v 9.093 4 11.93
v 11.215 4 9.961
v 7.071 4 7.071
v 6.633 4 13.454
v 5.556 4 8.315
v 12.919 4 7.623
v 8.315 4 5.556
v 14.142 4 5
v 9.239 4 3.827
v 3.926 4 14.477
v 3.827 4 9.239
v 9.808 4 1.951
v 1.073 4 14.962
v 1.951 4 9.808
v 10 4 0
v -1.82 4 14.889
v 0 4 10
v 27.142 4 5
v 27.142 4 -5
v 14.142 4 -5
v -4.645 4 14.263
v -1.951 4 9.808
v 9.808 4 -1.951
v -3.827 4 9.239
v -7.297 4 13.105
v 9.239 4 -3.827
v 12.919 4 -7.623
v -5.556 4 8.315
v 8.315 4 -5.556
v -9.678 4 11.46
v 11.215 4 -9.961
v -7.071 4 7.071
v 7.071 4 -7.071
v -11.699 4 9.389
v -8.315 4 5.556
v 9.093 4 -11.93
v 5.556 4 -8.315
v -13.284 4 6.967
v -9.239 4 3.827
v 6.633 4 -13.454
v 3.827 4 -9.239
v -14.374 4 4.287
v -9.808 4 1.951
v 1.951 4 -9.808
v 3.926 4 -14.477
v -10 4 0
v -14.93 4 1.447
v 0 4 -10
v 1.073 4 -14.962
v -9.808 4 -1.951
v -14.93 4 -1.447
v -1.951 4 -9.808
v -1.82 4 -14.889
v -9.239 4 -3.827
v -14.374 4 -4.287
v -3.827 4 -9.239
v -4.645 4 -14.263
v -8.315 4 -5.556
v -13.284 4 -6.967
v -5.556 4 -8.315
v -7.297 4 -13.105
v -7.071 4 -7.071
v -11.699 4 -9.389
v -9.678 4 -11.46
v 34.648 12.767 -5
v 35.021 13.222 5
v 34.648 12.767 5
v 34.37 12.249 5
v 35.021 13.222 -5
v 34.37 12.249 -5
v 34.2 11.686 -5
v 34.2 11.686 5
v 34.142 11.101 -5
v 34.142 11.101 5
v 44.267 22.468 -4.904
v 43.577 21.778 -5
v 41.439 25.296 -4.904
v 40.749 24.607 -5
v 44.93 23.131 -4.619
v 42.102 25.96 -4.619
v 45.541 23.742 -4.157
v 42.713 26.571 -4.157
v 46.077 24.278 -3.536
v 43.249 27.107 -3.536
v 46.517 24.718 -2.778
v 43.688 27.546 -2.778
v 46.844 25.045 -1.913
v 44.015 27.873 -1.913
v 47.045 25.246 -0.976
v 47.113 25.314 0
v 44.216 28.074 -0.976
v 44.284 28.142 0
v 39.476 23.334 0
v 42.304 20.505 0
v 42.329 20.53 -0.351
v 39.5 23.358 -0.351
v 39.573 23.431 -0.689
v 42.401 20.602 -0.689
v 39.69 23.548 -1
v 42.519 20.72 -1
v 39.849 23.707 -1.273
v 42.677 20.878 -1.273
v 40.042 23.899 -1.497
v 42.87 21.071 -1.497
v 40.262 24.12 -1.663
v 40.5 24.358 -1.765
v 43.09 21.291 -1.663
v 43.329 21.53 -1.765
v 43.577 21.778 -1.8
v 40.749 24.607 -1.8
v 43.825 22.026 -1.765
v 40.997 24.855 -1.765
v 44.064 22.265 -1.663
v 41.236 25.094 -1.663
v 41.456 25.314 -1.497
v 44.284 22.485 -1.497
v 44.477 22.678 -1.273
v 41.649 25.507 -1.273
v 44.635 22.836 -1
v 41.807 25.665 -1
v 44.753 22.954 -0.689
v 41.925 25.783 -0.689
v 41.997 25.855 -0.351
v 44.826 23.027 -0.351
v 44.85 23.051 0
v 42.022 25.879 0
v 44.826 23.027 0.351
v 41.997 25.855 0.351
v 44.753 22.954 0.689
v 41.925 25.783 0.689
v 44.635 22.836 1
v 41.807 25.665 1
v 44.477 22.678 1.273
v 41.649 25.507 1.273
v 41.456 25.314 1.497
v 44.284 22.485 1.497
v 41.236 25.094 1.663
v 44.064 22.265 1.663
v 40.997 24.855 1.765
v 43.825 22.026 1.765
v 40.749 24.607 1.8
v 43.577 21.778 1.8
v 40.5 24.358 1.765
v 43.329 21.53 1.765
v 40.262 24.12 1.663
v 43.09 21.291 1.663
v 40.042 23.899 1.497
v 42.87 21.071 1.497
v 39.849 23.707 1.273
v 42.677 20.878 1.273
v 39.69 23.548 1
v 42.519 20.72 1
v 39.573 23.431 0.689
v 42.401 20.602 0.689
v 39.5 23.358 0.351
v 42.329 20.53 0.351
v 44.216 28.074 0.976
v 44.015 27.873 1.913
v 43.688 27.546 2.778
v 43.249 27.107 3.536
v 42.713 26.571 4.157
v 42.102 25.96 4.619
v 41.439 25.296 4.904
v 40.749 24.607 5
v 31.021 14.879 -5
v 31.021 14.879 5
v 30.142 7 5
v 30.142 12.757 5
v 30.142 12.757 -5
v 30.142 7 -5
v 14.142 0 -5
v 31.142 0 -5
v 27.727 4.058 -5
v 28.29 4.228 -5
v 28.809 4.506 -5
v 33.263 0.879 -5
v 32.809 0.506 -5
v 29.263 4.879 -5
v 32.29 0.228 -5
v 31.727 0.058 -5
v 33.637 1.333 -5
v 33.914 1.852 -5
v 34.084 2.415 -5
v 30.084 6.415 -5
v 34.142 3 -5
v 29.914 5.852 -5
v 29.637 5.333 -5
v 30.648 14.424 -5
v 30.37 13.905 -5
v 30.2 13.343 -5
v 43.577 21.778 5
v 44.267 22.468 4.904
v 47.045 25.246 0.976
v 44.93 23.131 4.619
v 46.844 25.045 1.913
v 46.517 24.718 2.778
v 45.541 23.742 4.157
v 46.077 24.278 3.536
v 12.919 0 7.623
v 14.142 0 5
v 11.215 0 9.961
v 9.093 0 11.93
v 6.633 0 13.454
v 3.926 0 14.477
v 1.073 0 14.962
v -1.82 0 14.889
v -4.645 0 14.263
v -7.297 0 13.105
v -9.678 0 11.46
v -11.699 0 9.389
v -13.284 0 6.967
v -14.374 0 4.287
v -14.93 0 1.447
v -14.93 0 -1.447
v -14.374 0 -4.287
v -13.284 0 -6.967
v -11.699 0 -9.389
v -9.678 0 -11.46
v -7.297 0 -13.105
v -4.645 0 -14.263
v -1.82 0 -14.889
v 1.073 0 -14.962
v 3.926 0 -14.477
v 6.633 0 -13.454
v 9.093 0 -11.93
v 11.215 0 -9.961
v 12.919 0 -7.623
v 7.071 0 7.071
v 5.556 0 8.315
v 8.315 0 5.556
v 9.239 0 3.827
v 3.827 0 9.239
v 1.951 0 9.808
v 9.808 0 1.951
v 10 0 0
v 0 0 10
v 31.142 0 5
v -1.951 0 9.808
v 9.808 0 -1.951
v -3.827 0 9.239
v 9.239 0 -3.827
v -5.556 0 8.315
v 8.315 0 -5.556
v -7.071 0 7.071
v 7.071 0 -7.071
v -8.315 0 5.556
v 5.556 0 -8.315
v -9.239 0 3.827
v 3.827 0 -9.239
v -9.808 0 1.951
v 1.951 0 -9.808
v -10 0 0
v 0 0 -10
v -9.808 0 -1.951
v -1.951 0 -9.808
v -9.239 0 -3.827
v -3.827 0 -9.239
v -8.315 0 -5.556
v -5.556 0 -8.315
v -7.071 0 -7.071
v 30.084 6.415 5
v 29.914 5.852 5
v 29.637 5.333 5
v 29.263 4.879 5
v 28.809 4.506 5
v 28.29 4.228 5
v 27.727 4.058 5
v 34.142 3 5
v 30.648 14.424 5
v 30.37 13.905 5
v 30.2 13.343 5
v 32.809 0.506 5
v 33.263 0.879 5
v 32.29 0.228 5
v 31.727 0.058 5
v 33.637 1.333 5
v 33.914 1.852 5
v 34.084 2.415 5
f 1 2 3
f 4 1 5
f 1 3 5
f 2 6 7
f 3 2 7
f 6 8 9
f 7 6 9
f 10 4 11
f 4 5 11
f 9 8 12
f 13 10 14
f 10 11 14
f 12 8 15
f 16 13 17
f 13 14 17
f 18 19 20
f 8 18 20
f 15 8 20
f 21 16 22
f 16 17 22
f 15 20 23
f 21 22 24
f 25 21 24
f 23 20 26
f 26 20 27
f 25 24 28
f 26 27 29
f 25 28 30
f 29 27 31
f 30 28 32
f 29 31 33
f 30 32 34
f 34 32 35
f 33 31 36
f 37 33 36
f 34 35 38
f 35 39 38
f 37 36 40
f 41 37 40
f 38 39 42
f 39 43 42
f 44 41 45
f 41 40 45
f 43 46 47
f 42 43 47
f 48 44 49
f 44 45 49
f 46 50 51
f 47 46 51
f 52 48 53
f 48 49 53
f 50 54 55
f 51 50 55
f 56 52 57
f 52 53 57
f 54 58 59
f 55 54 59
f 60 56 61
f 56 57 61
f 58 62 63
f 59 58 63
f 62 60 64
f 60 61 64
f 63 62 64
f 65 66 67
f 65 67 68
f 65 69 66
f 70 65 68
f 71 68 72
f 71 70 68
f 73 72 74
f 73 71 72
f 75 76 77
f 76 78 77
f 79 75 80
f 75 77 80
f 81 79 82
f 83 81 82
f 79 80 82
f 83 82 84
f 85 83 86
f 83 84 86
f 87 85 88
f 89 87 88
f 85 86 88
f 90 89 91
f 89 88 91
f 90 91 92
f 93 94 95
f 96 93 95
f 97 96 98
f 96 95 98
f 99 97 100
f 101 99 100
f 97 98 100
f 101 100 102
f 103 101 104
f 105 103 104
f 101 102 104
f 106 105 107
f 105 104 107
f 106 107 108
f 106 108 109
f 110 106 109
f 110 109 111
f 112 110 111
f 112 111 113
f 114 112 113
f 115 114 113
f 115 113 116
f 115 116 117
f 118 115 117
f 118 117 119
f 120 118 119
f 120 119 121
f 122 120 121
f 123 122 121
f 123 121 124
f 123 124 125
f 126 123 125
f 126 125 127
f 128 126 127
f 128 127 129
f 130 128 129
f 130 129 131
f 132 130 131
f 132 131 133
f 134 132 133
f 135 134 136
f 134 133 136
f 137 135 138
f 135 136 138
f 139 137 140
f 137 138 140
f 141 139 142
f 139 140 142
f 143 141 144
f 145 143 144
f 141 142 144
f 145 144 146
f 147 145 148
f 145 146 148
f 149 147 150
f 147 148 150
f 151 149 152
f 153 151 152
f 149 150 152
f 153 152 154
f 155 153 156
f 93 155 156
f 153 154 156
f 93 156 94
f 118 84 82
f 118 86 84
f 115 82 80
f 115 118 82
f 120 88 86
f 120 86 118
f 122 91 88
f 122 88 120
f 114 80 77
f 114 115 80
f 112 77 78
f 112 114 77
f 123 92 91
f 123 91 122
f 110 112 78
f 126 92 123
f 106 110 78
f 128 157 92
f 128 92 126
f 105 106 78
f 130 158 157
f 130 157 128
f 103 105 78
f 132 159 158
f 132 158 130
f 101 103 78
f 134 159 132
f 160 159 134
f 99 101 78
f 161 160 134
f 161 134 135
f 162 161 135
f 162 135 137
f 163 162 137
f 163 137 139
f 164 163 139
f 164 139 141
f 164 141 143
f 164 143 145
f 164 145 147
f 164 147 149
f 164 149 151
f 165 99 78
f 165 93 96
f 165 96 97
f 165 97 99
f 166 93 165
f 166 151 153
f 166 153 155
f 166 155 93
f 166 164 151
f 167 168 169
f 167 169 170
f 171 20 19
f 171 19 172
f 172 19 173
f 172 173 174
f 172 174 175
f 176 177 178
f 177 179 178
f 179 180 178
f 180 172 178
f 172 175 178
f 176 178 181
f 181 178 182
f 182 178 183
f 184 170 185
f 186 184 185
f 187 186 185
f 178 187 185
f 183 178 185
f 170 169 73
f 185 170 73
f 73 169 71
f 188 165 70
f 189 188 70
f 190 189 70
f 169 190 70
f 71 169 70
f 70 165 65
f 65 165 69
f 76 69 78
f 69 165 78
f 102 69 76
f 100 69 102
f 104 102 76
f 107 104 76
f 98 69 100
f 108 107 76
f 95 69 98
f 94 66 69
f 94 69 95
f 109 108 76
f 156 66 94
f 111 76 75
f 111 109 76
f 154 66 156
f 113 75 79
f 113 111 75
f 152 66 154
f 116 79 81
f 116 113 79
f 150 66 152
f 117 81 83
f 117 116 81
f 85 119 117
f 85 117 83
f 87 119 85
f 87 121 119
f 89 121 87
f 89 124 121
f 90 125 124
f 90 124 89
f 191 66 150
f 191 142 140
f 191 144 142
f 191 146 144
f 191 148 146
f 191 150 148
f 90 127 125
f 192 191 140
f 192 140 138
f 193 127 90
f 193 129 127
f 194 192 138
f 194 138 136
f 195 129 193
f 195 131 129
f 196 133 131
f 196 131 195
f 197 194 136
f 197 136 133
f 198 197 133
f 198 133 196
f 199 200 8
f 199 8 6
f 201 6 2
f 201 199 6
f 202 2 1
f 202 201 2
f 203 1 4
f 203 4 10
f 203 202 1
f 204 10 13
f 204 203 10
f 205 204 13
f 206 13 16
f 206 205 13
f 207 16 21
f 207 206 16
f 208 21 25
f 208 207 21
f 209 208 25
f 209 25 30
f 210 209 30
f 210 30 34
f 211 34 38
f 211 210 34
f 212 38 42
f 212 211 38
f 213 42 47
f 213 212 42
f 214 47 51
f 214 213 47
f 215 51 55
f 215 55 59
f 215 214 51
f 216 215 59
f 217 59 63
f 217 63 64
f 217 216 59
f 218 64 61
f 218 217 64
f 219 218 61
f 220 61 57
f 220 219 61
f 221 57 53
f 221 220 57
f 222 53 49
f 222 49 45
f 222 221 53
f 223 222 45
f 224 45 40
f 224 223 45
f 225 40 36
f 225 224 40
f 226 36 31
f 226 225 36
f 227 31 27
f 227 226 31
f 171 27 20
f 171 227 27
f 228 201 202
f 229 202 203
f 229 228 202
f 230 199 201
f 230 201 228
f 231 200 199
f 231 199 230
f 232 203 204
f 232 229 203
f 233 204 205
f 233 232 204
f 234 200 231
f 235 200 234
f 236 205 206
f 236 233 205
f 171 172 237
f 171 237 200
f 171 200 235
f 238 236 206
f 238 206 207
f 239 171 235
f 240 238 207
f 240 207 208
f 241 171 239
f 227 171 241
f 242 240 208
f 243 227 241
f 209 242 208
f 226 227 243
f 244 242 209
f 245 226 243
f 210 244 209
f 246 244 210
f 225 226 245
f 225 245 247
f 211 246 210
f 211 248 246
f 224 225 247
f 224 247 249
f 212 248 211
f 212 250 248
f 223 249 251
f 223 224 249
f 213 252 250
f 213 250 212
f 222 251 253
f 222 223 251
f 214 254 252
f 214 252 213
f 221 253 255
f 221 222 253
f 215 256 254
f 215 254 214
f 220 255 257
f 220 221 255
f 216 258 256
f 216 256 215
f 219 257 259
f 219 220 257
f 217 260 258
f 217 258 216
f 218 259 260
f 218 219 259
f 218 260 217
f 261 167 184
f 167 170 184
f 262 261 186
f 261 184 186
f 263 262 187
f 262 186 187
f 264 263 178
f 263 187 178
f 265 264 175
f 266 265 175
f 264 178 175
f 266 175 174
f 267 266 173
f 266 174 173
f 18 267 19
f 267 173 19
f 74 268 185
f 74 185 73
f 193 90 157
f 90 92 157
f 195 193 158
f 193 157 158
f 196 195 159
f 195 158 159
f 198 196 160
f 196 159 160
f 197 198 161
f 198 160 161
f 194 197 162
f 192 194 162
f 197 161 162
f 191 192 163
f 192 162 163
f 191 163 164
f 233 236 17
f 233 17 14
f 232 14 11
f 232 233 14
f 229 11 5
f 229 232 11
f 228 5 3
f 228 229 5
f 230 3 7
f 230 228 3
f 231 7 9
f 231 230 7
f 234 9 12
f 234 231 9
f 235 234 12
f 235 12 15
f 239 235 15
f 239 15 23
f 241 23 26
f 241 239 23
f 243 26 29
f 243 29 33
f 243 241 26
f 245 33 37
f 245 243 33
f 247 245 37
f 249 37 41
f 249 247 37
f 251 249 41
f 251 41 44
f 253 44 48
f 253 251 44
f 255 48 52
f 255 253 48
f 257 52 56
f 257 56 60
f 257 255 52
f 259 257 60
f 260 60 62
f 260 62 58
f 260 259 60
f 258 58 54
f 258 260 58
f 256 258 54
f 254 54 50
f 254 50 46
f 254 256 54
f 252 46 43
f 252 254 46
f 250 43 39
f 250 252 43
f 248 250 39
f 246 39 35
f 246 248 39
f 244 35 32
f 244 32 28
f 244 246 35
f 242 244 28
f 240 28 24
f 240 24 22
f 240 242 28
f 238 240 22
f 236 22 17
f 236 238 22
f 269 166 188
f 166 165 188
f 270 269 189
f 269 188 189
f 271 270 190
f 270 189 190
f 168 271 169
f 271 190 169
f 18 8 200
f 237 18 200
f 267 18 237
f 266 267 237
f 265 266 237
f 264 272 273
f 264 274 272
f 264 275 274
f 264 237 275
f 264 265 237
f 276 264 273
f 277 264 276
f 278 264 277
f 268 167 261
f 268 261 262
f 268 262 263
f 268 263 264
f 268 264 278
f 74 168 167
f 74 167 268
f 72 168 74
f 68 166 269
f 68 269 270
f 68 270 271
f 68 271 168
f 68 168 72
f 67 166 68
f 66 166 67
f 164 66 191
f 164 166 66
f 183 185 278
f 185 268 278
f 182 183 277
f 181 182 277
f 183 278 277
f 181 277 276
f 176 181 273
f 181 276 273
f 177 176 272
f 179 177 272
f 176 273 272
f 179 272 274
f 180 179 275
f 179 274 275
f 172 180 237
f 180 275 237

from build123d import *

# Parameters (mm, degrees)
SKETCH2_R            = 10
BOSS_EXTRUDE1_DEPTH  = 4
BOSS_EXTRUDE2_DEPTH  = 10
FILLET1_R            = 5
M3_CLEARANCE_HOLE1_D = 3.6
FILLET2_R            = 3


with BuildPart() as part:
    # Sketch2 → Boss-Extrude1 (new body)
    with BuildSketch(Plane(origin=(0, 0, 0), x_dir=(1, 0, 0), z_dir=(0, 1, 0))):
        with BuildLine():
            Line((34.142135624, 5), (34.142135624, -5))
            Line((34.142135624, -5), (14.142135624, -5))
            ThreePointArc((14.142135624, -5), (-15, 0), (14.142135624, 5))
            Line((14.142135624, 5), (34.142135624, 5))
        make_face()
        with Locations(Location((0, 0, 0), (0, 0, 270))):
            Circle(SKETCH2_R, mode=Mode.SUBTRACT)
    extrude(amount=BOSS_EXTRUDE1_DEPTH)

    # Sketch3 → Boss-Extrude2 (add)
    with BuildSketch(Plane.XY.offset(5)):
        Polygon((34.142135624, 4), (34.142135624, 12.343145751), (47.112698372, 25.313708499), (44.284271247, 28.142135624), (30.142135624, 14), (30.142135624, 4), align=None)
    extrude(amount=-BOSS_EXTRUDE2_DEPTH)

    # Fillet1
    fillet1_edges = [part.edges().sort_by_distance(p)[0] for p in [
        (45.69848481, 26.727922061, 5),
        (45.69848481, 26.727922061, -5),
    ]]
    fillet(fillet1_edges, radius=FILLET1_R - 0.0001)  # a hair under: the kernel refuses the full size

    # M3 Clearance Hole1 (through all)
    with Locations(Plane(origin=(8.071067812, -8.071067812, 0), x_dir=(0.7071067811865486, 0.7071067811865465, 0), z_dir=(-0.7071067811865465, 0.7071067811865486, 0))):
        with Locations((46.213203436, 0)):
            Hole(M3_CLEARANCE_HOLE1_D / 2)

    # Fillet2
    fillet2_edges = [part.edges().sort_by_distance(p)[0] for p in [
        (30.142135624, 4, 0),
        (30.142135624, 14, 0),
        (34.142135624, 12.343145751, 0),
        (34.142135624, 0, 0),
    ]]
    fillet(fillet2_edges, radius=FILLET2_R)


solid = part.part
